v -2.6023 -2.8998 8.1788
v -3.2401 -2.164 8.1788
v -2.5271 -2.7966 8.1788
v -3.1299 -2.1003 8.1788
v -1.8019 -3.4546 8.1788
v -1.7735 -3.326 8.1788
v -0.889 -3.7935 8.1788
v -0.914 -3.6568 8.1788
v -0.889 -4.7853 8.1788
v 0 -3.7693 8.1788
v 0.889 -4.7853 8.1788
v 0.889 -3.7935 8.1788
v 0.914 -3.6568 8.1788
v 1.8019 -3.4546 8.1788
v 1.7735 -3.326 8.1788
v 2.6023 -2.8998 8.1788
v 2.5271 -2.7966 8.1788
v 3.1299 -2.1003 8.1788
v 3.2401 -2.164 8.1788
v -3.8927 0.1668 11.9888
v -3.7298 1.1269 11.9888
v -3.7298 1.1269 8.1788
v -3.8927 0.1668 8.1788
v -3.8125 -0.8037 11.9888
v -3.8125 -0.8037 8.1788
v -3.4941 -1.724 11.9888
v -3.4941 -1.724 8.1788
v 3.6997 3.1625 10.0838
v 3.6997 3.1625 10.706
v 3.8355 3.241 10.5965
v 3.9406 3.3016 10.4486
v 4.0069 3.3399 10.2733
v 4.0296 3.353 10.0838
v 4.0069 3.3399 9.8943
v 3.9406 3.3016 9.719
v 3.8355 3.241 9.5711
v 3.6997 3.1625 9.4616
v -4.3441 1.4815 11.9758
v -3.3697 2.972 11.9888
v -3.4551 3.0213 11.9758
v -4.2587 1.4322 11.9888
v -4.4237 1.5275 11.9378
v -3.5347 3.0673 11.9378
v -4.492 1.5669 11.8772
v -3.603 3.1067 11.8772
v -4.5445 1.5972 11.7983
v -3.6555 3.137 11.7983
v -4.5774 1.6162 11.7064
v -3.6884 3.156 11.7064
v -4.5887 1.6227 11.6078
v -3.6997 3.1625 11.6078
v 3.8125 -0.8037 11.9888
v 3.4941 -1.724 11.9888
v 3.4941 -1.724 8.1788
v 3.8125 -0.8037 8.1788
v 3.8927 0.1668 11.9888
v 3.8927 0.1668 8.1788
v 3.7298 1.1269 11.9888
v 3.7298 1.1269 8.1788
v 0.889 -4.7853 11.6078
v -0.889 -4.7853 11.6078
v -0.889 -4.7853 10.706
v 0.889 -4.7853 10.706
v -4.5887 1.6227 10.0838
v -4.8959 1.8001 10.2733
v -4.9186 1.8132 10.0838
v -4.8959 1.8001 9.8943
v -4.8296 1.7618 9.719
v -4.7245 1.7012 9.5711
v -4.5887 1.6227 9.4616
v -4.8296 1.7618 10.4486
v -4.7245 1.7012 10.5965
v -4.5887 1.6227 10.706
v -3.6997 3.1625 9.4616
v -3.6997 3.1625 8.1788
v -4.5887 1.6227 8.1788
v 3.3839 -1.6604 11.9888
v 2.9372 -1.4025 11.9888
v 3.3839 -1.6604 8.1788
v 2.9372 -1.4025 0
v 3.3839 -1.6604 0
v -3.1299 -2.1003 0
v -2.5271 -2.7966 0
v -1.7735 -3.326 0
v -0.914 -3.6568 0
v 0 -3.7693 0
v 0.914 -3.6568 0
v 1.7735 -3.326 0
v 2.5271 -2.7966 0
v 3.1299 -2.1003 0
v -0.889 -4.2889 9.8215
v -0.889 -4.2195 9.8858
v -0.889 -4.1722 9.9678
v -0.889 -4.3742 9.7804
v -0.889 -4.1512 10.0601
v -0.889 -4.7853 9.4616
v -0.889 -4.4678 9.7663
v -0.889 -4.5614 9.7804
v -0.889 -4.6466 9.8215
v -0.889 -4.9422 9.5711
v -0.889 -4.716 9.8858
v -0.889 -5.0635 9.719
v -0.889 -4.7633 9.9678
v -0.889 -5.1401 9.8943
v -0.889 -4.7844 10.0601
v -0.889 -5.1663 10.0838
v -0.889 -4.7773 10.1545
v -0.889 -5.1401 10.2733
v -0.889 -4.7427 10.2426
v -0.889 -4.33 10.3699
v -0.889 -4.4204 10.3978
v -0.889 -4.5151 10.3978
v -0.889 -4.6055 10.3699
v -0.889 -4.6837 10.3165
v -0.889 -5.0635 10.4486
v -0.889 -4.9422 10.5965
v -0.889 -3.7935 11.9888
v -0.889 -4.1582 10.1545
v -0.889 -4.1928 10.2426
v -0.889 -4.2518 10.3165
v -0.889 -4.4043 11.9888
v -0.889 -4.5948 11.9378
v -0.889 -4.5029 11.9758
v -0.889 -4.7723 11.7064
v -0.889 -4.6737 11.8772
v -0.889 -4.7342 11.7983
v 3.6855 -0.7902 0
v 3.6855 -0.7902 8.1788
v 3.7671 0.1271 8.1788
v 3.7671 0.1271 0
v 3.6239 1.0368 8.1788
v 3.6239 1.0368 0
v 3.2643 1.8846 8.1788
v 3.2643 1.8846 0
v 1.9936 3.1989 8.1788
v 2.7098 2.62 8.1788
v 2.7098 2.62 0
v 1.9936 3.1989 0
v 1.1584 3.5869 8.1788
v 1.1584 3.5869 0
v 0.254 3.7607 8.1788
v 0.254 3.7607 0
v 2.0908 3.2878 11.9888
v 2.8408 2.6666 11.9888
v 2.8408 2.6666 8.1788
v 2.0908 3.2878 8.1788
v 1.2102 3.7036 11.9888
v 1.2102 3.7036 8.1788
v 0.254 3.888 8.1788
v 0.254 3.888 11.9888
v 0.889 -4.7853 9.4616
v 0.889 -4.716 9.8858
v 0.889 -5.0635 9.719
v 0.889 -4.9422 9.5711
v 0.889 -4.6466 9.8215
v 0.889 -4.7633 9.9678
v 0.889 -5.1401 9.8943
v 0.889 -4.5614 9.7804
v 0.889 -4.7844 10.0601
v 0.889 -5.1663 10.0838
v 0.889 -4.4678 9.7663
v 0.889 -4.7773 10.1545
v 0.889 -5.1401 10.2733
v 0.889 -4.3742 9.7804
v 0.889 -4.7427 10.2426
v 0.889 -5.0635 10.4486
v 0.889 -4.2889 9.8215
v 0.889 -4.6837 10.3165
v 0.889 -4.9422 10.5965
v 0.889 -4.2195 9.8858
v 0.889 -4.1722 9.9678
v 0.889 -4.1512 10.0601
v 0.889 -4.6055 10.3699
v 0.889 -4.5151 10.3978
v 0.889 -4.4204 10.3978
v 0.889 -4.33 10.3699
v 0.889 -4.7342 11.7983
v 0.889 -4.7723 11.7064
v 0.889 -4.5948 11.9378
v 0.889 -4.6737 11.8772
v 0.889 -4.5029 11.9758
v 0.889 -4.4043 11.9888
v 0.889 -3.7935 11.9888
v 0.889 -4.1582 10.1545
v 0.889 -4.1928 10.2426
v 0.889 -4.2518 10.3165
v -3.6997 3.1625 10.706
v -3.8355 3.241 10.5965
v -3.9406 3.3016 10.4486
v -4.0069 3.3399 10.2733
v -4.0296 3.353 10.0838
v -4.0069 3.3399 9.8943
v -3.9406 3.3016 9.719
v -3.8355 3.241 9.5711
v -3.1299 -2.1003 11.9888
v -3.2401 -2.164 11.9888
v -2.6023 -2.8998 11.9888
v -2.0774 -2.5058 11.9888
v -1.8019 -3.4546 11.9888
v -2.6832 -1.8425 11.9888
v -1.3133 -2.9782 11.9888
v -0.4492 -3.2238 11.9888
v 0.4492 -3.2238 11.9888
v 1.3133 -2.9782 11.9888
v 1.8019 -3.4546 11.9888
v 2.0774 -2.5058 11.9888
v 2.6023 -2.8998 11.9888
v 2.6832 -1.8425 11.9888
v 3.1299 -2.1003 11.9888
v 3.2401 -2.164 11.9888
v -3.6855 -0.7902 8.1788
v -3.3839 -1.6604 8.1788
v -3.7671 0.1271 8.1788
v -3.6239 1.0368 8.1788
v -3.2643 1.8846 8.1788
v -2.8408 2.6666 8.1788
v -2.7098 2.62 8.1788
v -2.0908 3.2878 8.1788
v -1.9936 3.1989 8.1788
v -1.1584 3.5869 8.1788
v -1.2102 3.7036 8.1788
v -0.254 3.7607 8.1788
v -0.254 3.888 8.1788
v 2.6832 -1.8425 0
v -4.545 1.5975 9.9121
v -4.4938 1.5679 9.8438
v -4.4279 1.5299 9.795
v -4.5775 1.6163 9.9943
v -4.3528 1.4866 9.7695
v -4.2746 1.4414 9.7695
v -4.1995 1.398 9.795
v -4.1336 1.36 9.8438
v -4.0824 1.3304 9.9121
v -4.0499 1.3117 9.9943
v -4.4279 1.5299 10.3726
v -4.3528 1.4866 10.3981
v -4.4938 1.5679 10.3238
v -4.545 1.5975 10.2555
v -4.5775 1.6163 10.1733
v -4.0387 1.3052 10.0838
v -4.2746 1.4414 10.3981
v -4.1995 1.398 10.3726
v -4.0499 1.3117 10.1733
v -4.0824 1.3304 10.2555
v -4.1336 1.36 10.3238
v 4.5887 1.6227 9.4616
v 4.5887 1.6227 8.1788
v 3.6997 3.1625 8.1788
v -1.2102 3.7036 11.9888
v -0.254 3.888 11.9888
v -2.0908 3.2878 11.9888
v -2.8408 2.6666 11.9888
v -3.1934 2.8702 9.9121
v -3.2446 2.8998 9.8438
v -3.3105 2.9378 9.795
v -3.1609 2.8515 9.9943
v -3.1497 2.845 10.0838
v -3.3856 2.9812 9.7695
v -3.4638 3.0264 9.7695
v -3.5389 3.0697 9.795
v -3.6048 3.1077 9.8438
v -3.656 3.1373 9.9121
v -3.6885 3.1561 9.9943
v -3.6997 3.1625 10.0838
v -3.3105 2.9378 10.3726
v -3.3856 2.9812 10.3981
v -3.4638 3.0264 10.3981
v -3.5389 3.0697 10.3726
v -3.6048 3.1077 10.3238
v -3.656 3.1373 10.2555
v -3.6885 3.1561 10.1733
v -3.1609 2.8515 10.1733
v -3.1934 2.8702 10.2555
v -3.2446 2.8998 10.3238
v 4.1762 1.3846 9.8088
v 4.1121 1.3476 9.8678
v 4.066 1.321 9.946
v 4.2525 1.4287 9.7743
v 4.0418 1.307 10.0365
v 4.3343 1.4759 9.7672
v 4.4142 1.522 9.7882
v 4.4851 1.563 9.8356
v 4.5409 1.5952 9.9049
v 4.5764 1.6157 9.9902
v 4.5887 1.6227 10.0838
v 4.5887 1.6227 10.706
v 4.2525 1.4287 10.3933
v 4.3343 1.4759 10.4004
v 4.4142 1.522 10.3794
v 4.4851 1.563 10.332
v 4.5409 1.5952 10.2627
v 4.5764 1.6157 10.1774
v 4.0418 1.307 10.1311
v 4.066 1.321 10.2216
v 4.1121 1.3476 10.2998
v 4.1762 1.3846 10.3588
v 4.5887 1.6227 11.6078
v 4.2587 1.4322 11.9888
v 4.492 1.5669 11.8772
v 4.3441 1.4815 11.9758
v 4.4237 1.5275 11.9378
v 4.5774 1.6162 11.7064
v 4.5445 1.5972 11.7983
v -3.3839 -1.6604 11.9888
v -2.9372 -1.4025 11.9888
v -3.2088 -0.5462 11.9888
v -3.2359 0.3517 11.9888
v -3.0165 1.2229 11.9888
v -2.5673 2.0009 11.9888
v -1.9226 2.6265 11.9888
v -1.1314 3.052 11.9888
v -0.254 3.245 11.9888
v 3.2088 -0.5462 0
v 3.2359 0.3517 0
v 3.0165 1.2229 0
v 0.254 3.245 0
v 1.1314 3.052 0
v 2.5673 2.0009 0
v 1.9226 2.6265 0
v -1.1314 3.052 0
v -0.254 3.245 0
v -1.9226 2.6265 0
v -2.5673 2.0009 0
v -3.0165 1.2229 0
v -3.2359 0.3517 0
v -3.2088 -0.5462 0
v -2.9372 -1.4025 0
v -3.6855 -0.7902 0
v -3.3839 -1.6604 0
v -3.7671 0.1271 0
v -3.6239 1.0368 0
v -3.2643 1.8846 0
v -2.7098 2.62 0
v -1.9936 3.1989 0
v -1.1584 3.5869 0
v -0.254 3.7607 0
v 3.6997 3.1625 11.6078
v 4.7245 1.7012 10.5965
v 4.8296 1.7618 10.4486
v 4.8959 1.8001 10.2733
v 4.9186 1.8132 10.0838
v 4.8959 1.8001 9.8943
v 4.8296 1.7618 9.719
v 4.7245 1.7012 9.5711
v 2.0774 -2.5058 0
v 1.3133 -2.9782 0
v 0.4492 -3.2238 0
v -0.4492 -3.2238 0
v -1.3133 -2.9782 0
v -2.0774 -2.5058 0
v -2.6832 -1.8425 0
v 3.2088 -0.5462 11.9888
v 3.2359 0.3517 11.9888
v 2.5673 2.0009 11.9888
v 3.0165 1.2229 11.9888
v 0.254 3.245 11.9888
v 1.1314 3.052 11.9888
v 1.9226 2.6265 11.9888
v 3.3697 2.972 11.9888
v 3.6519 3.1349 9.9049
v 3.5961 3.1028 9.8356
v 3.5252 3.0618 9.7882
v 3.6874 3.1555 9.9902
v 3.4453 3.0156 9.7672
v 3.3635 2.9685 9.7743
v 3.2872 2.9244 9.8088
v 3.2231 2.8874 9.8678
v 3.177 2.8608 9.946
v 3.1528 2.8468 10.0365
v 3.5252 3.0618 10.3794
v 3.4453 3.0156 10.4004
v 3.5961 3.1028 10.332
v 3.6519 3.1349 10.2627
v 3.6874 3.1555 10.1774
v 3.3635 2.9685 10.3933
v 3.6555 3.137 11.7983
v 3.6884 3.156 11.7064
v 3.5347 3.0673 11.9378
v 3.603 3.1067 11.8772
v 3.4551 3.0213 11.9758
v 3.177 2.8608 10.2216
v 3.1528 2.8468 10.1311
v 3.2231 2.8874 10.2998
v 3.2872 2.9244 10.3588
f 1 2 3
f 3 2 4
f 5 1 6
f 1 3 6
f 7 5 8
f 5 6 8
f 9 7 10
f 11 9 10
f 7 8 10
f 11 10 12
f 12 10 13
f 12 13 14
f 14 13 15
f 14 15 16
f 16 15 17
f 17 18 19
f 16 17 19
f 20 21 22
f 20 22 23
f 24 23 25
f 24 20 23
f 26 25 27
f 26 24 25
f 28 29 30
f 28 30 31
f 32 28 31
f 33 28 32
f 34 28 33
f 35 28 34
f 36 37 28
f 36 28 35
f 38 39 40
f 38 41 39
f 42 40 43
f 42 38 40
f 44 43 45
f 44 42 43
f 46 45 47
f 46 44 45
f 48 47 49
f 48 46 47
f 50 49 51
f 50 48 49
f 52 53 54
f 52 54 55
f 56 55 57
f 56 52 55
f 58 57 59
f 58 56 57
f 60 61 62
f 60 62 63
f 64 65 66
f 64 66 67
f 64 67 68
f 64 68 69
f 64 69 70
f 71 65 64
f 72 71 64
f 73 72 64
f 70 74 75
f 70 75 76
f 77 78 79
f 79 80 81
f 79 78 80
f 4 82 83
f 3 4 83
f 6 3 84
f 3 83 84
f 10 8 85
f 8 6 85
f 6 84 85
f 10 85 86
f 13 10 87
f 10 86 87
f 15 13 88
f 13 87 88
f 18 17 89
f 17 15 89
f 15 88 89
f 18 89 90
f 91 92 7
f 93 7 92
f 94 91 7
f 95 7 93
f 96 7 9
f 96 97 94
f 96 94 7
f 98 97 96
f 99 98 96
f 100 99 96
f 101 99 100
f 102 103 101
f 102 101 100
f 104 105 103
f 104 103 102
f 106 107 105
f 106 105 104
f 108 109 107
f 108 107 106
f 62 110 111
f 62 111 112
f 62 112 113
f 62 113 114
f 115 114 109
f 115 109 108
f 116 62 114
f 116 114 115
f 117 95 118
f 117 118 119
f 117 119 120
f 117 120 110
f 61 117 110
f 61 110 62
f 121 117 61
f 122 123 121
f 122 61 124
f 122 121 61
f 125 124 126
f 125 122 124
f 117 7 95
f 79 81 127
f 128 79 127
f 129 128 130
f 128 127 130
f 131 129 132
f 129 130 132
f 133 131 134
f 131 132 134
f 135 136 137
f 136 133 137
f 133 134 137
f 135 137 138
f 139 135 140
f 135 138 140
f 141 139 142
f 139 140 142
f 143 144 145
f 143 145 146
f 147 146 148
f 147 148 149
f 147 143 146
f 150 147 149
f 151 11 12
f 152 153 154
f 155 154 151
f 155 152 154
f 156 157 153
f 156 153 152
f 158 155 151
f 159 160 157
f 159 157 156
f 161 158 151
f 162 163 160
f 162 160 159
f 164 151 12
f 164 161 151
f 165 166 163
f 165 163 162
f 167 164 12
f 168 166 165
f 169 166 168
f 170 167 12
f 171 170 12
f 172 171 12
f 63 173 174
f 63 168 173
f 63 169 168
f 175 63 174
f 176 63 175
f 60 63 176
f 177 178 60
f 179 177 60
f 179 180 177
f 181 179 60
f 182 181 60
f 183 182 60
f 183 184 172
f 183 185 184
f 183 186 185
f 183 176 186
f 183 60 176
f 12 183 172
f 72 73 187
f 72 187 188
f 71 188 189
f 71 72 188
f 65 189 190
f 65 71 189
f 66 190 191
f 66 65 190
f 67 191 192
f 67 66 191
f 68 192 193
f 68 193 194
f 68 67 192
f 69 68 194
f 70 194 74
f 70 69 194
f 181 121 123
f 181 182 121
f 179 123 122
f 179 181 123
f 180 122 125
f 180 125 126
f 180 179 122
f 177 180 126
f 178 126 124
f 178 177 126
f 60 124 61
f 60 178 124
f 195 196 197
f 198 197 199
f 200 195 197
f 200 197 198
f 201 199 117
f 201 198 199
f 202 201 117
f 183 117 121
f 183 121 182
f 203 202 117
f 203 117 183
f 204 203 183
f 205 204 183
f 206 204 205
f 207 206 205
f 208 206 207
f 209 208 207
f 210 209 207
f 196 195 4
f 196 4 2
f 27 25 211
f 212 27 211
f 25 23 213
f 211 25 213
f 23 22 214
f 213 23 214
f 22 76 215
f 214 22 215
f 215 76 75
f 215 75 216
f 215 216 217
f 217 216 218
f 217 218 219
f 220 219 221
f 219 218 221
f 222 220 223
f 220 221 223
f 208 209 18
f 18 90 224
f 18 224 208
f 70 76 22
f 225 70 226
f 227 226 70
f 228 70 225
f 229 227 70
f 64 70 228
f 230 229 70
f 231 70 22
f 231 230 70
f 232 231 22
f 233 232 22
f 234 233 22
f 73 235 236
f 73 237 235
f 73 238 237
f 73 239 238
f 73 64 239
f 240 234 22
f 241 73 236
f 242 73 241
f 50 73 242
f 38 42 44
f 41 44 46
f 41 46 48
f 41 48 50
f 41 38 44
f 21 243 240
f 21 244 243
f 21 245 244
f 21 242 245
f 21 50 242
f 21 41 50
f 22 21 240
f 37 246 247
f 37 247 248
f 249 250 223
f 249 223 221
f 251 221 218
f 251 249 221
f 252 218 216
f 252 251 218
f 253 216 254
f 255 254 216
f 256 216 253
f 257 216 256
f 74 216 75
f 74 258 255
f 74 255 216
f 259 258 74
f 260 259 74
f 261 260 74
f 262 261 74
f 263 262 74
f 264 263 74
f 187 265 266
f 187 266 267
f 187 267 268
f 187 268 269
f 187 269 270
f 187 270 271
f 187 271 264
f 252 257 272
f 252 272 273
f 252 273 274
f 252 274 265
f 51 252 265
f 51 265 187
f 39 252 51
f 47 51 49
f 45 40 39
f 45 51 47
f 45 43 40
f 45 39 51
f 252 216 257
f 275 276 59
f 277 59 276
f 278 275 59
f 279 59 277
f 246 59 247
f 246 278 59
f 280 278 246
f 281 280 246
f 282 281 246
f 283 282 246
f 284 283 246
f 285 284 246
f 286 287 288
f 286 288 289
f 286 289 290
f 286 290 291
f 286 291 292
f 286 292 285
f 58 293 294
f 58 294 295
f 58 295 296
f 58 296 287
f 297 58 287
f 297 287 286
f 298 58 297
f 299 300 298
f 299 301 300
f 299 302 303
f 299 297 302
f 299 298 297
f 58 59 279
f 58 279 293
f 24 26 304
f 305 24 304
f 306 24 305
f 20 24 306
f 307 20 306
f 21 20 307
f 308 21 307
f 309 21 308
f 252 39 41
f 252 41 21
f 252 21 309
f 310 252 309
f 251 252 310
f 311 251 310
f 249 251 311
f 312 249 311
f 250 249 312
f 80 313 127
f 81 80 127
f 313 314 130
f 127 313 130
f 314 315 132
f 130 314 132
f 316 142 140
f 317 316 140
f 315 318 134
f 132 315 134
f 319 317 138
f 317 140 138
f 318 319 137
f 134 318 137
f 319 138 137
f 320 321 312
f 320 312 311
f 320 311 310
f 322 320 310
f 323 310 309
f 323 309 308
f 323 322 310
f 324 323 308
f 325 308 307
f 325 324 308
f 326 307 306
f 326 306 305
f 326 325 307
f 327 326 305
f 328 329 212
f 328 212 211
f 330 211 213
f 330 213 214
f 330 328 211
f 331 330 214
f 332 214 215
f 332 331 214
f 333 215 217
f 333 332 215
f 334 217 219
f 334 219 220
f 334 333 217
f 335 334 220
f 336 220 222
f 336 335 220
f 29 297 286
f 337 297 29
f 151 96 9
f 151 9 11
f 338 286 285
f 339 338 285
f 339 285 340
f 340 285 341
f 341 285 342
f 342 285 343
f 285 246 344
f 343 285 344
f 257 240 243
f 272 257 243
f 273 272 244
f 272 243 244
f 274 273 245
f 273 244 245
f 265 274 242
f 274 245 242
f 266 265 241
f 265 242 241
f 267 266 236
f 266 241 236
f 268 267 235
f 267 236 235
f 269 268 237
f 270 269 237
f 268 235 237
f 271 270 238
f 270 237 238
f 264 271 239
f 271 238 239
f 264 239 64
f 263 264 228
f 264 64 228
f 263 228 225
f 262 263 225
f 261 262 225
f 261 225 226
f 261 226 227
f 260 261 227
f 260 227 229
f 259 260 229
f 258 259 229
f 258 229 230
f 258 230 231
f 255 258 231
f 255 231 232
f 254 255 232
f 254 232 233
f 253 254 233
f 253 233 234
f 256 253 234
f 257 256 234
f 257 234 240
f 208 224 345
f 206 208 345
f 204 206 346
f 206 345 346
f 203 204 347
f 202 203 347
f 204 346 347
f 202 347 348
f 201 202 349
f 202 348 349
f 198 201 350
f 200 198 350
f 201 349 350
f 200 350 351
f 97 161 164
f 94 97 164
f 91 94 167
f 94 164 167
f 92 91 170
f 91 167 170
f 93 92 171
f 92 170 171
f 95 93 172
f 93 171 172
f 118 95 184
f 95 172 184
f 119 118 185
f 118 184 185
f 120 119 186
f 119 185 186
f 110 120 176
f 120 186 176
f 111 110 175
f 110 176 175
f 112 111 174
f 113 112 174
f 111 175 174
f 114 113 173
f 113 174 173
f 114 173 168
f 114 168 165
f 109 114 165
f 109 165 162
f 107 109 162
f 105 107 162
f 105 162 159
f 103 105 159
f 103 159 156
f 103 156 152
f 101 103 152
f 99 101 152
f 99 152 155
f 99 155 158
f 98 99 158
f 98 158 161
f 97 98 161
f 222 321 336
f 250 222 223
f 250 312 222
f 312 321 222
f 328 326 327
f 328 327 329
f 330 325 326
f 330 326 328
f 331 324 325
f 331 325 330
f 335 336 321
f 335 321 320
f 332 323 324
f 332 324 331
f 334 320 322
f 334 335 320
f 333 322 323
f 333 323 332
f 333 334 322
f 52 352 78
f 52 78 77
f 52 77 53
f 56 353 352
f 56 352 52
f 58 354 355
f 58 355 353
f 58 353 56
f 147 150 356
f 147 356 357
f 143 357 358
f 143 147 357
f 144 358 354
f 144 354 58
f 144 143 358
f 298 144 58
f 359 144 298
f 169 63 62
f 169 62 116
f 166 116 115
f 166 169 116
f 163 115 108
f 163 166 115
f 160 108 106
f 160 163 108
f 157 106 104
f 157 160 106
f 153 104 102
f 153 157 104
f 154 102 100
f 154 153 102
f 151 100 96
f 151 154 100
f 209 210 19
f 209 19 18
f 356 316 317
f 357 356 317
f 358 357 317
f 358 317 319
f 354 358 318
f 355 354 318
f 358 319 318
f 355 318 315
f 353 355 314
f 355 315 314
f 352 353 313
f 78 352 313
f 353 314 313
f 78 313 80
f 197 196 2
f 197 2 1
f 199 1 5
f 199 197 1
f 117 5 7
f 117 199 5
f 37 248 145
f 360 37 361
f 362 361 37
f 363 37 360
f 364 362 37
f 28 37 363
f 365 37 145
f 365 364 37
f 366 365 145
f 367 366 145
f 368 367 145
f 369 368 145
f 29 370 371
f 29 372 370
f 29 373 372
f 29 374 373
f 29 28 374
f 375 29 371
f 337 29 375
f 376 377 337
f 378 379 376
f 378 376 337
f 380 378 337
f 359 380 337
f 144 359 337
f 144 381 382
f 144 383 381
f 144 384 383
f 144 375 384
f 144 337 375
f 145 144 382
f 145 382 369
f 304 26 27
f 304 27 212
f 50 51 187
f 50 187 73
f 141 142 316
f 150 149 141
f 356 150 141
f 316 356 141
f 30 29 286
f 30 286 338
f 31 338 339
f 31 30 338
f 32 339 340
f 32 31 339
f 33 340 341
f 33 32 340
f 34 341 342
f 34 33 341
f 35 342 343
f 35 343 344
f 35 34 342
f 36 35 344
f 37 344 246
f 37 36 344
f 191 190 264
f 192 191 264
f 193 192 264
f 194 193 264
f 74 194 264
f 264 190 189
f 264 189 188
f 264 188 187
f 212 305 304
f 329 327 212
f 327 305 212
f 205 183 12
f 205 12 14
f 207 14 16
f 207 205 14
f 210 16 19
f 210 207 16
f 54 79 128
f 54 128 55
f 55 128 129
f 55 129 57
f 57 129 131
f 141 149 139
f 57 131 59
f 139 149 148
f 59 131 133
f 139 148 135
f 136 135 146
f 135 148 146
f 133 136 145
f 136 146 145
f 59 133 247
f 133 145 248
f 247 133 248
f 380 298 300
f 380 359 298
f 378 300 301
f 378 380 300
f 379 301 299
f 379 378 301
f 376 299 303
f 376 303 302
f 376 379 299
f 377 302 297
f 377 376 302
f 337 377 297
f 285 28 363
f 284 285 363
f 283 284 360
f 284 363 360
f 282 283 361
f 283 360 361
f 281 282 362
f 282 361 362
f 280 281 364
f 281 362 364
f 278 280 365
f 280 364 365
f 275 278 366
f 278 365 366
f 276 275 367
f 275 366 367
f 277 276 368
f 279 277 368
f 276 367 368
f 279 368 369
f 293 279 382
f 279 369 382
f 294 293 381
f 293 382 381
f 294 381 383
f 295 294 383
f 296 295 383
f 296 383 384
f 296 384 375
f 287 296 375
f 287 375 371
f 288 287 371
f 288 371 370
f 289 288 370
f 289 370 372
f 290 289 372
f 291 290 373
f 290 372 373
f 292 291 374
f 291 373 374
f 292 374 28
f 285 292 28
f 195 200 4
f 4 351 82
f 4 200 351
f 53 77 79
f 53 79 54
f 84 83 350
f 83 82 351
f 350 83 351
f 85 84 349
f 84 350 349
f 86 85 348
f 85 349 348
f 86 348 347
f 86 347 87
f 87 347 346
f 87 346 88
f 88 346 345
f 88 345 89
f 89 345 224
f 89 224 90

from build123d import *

# Parameters (mm, degrees)
BOSS_EXTRUDE1_DEPTH   = 11.9888
BOSS_EXTRUDE1_2_DEPTH = 11.9888
BOSS_EXTRUDE1_3_DEPTH = 11.9888
BOSS_EXTRUDE2_DEPTH   = 3.81
BOSS_EXTRUDE3_DEPTH   = 3.81
FILLET1_R             = 0.381
FILLET2_R             = 0.381
FILLET3_R             = 0.381
BOSS_EXTRUDE4_DEPTH   = 1.778
SKETCH5_6_R           = 0.3175
CUT_EXTRUDE1_DEPTH    = 1.778
BOSS_EXTRUDE5_DEPTH   = 1.778
SKETCH6_3_R           = 0.3175
CUT_EXTRUDE2_DEPTH    = 7.715402184
BOSS_EXTRUDE6_DEPTH   = 1.778
SKETCH7_3_R           = 0.3175
CUT_EXTRUDE3_DEPTH    = 6.807621385


with BuildPart() as part:
    # Sketch1 → Boss-Extrude1 (new body)
    with BuildSketch(Plane.XY):
        with BuildLine():
            Line((-0.254, 3.760702479), (-0.254, 3.244994166))
            ThreePointArc((-0.254, 3.244994166), (-2.818843265, 1.627459918), (-2.937247383, -1.402526631))
            Line((-2.937247383, -1.402526631), (-3.383863883, -1.660380787))
            ThreePointArc((-3.383863883, -1.660380787), (-3.264283896, 1.884635186), (-0.254, 3.760702479))
        make_face()
    extrude(amount=BOSS_EXTRUDE1_DEPTH)



with BuildPart() as body_2:
    # Sketch1 → Boss-Extrude1 2 (new body)
    with BuildSketch(Plane.XY):
        with BuildLine():
            Line((0.254, 3.760702479), (0.254, 3.244994166))
            ThreePointArc((0.254, 3.244994166), (2.818843265, 1.627459918), (2.937247383, -1.402526631))
            Line((2.937247383, -1.402526631), (3.383863883, -1.660380787))
            ThreePointArc((3.383863883, -1.660380787), (3.264283896, 1.884635186), (0.254, 3.760702479))
        make_face()
    extrude(amount=BOSS_EXTRUDE1_2_DEPTH)


with BuildPart() as body_3:
    # Sketch1 → Boss-Extrude1 3 (new body)
    with BuildSketch(Plane.XY):
        with BuildLine():
            Line((3.129863883, -2.100321692), (2.683247383, -1.842467536))
            ThreePointArc((2.683247383, -1.842467536), (0, -3.254919836), (-2.683247383, -1.842467536))
            Line((-2.683247383, -1.842467536), (-3.129863883, -2.100321692))
            ThreePointArc((-3.129863883, -2.100321692), (0, -3.769270372), (3.129863883, -2.100321692))
        make_face()
    extrude(amount=BOSS_EXTRUDE1_3_DEPTH)


with BuildPart() as part_1:
    add(part.part)

    add(body_2.part)  # Boss-Extrude2 merges body 2

    add(body_3.part)  # Boss-Extrude2 merges body 3
    # Sketch2 → Boss-Extrude2 (add)
    with BuildSketch(Plane.XY.offset(11.9888)):
        with BuildLine():
            Line((-0.254, 3.760702479), (-0.254, 3.887982358))
            ThreePointArc((-0.254, 3.887982358), (-3.374269122, 1.948135186), (-3.494091491, -1.724020726))
            Line((-3.494091491, -1.724020726), (-3.383863883, -1.660380787))
            ThreePointArc((-3.383863883, -1.660380787), (-3.264283896, 1.884635186), (-0.254, 3.760702479))
        make_face()
        with BuildLine():
            Line((0.254, 3.887982358), (0.254, 3.760702479))
            ThreePointArc((0.254, 3.760702479), (3.264283896, 1.884635186), (3.383863883, -1.660380787))
            Line((3.383863883, -1.660380787), (3.494091491, -1.724020726))
            ThreePointArc((3.494091491, -1.724020726), (3.374269122, 1.948135186), (0.254, 3.887982358))
        make_face()
        with BuildLine():
            Line((3.240091491, -2.163961631), (3.129863883, -2.100321692))
            ThreePointArc((3.129863883, -2.100321692), (0, -3.769270372), (-3.129863883, -2.100321692))
            Line((-3.129863883, -2.100321692), (-3.240091491, -2.163961631))
            ThreePointArc((-3.240091491, -2.163961631), (0, -3.896270372), (3.240091491, -2.163961631))
        make_face()
    extrude(amount=-BOSS_EXTRUDE2_DEPTH)

    # Sketch4 → Boss-Extrude3 (add)
    with BuildSketch(Plane.XY.offset(11.9888)):
        with BuildLine():
            Line((-2.840762754, 2.666643919), (-3.699665706, 3.16253177))
            Line((-3.699665706, 3.16253177), (-4.588665706, 1.622738602))
            Line((-4.588665706, 1.622738602), (-3.729762754, 1.126850751))
            ThreePointArc((-3.729762754, 1.126850751), (-3.374269122, 1.948135186), (-2.840762754, 2.666643919))
        make_face()
        with BuildLine():
            Line((-0.889, -3.79349467), (-0.889, -4.785270372))
            Line((-0.889, -4.785270372), (0.889, -4.785270372))
            Line((0.889, -4.785270372), (0.889, -3.79349467))
            ThreePointArc((0.889, -3.79349467), (0, -3.896270372), (-0.889, -3.79349467))
        make_face()
        with BuildLine():
            Line((3.729762754, 1.126850751), (4.588665706, 1.622738602))
            Line((4.588665706, 1.622738602), (3.699665706, 3.16253177))
            Line((3.699665706, 3.16253177), (2.840762754, 2.666643919))
            ThreePointArc((2.840762754, 2.666643919), (3.374269122, 1.948135186), (3.729762754, 1.126850751))
        make_face()
    extrude(amount=-BOSS_EXTRUDE3_DEPTH)

    # Fillet1
    fillet1_edges = [part_1.edges().sort_by_distance(p)[0] for p in [
        (-4.144165706, 2.392635186, 11.9888),
    ]]
    fillet(fillet1_edges, radius=FILLET1_R)

    # Fillet2
    fillet2_edges = [part_1.edges().sort_by_distance(p)[0] for p in [
        (0, -4.785270372, 11.9888),
    ]]
    fillet(fillet2_edges, radius=FILLET2_R)

    # Fillet3
    fillet3_edges = [part_1.edges().sort_by_distance(p)[0] for p in [
        (4.144165706, 2.392635186, 11.9888),
    ]]
    fillet(fillet3_edges, radius=FILLET3_R)

    # Sketch5 → Boss-Extrude4 (add)
    with BuildSketch(Plane(origin=(-0.4445, 0.769896584, 0), x_dir=(0.866025404, 0.5, 0), z_dir=(-0.5, 0.866025404, 0))):
        with BuildLine():
            ThreePointArc((4.785270372, -10.705970395), (5.166270372, -10.0838), (4.785270372, -9.461629605))
            Line((4.785270372, -9.461629605), (4.785270372, -10.0838))
            Line((4.785270372, -10.0838), (4.785270372, -10.705970395))
        make_face()
    extrude(amount=-BOSS_EXTRUDE4_DEPTH)

    # Sketch5<6> → Cut-Extrude1 (cut)
    with BuildSketch(Plane(origin=(-0.4445, 0.769896584, 0), x_dir=(0.866025404, 0.5, 0), z_dir=(-0.5, 0.866025404, 0))):
        with Locations((4.467770372, -10.0838)):
            Circle(SKETCH5_6_R)
    extrude(amount=-CUT_EXTRUDE1_DEPTH, mode=Mode.SUBTRACT)

    # Sketch6 → Boss-Extrude5 (add)
    with BuildSketch(Plane(origin=(-0.4445, -0.769896584, 0), x_dir=(0.866025404, -0.5, 0), z_dir=(-0.5, -0.866025404, 0))):
        with BuildLine():
            ThreePointArc((-4.785270372, 10.705970395), (-5.166270372, 10.0838), (-4.785270372, 9.461629605))
            Line((-4.785270372, 9.461629605), (-4.785270372, 10.0838))
            Line((-4.785270372, 10.0838), (-4.785270372, 10.705970395))
        make_face()
    extrude(amount=-BOSS_EXTRUDE5_DEPTH)

    # Sketch6<3> → Cut-Extrude2 (cut, through all)
    with BuildSketch(Plane(origin=(-0.4445, -0.769896584, 0), x_dir=(0.866025404, -0.5, 0), z_dir=(-0.5, -0.866025404, 0))):
        with Locations((-4.467770372, 10.0838)):
            Circle(SKETCH6_3_R)
    extrude(amount=-CUT_EXTRUDE2_DEPTH, mode=Mode.SUBTRACT)

    # Sketch7 → Boss-Extrude6 (add)
    with BuildSketch(Plane(origin=(0.889, 0, 0), x_dir=(0, 0, -1), z_dir=(1, 0, 0))):
        with BuildLine():
            ThreePointArc((-10.705970395, -4.785270372), (-10.0838, -5.166270372), (-9.461629605, -4.785270372))
            Line((-9.461629605, -4.785270372), (-10.0838, -4.785270372))
            Line((-10.0838, -4.785270372), (-10.705970395, -4.785270372))
        make_face()
    extrude(amount=-BOSS_EXTRUDE6_DEPTH)

    # Sketch7<3> → Cut-Extrude3 (cut, through all)
    with BuildSketch(Plane(origin=(0.889, 0, 0), x_dir=(0, 0, -1), z_dir=(1, 0, 0))):
        with Locations((-10.0838, -4.467770372)):
            Circle(SKETCH7_3_R)
    extrude(amount=-CUT_EXTRUDE3_DEPTH, mode=Mode.SUBTRACT)


solid = part_1.part
